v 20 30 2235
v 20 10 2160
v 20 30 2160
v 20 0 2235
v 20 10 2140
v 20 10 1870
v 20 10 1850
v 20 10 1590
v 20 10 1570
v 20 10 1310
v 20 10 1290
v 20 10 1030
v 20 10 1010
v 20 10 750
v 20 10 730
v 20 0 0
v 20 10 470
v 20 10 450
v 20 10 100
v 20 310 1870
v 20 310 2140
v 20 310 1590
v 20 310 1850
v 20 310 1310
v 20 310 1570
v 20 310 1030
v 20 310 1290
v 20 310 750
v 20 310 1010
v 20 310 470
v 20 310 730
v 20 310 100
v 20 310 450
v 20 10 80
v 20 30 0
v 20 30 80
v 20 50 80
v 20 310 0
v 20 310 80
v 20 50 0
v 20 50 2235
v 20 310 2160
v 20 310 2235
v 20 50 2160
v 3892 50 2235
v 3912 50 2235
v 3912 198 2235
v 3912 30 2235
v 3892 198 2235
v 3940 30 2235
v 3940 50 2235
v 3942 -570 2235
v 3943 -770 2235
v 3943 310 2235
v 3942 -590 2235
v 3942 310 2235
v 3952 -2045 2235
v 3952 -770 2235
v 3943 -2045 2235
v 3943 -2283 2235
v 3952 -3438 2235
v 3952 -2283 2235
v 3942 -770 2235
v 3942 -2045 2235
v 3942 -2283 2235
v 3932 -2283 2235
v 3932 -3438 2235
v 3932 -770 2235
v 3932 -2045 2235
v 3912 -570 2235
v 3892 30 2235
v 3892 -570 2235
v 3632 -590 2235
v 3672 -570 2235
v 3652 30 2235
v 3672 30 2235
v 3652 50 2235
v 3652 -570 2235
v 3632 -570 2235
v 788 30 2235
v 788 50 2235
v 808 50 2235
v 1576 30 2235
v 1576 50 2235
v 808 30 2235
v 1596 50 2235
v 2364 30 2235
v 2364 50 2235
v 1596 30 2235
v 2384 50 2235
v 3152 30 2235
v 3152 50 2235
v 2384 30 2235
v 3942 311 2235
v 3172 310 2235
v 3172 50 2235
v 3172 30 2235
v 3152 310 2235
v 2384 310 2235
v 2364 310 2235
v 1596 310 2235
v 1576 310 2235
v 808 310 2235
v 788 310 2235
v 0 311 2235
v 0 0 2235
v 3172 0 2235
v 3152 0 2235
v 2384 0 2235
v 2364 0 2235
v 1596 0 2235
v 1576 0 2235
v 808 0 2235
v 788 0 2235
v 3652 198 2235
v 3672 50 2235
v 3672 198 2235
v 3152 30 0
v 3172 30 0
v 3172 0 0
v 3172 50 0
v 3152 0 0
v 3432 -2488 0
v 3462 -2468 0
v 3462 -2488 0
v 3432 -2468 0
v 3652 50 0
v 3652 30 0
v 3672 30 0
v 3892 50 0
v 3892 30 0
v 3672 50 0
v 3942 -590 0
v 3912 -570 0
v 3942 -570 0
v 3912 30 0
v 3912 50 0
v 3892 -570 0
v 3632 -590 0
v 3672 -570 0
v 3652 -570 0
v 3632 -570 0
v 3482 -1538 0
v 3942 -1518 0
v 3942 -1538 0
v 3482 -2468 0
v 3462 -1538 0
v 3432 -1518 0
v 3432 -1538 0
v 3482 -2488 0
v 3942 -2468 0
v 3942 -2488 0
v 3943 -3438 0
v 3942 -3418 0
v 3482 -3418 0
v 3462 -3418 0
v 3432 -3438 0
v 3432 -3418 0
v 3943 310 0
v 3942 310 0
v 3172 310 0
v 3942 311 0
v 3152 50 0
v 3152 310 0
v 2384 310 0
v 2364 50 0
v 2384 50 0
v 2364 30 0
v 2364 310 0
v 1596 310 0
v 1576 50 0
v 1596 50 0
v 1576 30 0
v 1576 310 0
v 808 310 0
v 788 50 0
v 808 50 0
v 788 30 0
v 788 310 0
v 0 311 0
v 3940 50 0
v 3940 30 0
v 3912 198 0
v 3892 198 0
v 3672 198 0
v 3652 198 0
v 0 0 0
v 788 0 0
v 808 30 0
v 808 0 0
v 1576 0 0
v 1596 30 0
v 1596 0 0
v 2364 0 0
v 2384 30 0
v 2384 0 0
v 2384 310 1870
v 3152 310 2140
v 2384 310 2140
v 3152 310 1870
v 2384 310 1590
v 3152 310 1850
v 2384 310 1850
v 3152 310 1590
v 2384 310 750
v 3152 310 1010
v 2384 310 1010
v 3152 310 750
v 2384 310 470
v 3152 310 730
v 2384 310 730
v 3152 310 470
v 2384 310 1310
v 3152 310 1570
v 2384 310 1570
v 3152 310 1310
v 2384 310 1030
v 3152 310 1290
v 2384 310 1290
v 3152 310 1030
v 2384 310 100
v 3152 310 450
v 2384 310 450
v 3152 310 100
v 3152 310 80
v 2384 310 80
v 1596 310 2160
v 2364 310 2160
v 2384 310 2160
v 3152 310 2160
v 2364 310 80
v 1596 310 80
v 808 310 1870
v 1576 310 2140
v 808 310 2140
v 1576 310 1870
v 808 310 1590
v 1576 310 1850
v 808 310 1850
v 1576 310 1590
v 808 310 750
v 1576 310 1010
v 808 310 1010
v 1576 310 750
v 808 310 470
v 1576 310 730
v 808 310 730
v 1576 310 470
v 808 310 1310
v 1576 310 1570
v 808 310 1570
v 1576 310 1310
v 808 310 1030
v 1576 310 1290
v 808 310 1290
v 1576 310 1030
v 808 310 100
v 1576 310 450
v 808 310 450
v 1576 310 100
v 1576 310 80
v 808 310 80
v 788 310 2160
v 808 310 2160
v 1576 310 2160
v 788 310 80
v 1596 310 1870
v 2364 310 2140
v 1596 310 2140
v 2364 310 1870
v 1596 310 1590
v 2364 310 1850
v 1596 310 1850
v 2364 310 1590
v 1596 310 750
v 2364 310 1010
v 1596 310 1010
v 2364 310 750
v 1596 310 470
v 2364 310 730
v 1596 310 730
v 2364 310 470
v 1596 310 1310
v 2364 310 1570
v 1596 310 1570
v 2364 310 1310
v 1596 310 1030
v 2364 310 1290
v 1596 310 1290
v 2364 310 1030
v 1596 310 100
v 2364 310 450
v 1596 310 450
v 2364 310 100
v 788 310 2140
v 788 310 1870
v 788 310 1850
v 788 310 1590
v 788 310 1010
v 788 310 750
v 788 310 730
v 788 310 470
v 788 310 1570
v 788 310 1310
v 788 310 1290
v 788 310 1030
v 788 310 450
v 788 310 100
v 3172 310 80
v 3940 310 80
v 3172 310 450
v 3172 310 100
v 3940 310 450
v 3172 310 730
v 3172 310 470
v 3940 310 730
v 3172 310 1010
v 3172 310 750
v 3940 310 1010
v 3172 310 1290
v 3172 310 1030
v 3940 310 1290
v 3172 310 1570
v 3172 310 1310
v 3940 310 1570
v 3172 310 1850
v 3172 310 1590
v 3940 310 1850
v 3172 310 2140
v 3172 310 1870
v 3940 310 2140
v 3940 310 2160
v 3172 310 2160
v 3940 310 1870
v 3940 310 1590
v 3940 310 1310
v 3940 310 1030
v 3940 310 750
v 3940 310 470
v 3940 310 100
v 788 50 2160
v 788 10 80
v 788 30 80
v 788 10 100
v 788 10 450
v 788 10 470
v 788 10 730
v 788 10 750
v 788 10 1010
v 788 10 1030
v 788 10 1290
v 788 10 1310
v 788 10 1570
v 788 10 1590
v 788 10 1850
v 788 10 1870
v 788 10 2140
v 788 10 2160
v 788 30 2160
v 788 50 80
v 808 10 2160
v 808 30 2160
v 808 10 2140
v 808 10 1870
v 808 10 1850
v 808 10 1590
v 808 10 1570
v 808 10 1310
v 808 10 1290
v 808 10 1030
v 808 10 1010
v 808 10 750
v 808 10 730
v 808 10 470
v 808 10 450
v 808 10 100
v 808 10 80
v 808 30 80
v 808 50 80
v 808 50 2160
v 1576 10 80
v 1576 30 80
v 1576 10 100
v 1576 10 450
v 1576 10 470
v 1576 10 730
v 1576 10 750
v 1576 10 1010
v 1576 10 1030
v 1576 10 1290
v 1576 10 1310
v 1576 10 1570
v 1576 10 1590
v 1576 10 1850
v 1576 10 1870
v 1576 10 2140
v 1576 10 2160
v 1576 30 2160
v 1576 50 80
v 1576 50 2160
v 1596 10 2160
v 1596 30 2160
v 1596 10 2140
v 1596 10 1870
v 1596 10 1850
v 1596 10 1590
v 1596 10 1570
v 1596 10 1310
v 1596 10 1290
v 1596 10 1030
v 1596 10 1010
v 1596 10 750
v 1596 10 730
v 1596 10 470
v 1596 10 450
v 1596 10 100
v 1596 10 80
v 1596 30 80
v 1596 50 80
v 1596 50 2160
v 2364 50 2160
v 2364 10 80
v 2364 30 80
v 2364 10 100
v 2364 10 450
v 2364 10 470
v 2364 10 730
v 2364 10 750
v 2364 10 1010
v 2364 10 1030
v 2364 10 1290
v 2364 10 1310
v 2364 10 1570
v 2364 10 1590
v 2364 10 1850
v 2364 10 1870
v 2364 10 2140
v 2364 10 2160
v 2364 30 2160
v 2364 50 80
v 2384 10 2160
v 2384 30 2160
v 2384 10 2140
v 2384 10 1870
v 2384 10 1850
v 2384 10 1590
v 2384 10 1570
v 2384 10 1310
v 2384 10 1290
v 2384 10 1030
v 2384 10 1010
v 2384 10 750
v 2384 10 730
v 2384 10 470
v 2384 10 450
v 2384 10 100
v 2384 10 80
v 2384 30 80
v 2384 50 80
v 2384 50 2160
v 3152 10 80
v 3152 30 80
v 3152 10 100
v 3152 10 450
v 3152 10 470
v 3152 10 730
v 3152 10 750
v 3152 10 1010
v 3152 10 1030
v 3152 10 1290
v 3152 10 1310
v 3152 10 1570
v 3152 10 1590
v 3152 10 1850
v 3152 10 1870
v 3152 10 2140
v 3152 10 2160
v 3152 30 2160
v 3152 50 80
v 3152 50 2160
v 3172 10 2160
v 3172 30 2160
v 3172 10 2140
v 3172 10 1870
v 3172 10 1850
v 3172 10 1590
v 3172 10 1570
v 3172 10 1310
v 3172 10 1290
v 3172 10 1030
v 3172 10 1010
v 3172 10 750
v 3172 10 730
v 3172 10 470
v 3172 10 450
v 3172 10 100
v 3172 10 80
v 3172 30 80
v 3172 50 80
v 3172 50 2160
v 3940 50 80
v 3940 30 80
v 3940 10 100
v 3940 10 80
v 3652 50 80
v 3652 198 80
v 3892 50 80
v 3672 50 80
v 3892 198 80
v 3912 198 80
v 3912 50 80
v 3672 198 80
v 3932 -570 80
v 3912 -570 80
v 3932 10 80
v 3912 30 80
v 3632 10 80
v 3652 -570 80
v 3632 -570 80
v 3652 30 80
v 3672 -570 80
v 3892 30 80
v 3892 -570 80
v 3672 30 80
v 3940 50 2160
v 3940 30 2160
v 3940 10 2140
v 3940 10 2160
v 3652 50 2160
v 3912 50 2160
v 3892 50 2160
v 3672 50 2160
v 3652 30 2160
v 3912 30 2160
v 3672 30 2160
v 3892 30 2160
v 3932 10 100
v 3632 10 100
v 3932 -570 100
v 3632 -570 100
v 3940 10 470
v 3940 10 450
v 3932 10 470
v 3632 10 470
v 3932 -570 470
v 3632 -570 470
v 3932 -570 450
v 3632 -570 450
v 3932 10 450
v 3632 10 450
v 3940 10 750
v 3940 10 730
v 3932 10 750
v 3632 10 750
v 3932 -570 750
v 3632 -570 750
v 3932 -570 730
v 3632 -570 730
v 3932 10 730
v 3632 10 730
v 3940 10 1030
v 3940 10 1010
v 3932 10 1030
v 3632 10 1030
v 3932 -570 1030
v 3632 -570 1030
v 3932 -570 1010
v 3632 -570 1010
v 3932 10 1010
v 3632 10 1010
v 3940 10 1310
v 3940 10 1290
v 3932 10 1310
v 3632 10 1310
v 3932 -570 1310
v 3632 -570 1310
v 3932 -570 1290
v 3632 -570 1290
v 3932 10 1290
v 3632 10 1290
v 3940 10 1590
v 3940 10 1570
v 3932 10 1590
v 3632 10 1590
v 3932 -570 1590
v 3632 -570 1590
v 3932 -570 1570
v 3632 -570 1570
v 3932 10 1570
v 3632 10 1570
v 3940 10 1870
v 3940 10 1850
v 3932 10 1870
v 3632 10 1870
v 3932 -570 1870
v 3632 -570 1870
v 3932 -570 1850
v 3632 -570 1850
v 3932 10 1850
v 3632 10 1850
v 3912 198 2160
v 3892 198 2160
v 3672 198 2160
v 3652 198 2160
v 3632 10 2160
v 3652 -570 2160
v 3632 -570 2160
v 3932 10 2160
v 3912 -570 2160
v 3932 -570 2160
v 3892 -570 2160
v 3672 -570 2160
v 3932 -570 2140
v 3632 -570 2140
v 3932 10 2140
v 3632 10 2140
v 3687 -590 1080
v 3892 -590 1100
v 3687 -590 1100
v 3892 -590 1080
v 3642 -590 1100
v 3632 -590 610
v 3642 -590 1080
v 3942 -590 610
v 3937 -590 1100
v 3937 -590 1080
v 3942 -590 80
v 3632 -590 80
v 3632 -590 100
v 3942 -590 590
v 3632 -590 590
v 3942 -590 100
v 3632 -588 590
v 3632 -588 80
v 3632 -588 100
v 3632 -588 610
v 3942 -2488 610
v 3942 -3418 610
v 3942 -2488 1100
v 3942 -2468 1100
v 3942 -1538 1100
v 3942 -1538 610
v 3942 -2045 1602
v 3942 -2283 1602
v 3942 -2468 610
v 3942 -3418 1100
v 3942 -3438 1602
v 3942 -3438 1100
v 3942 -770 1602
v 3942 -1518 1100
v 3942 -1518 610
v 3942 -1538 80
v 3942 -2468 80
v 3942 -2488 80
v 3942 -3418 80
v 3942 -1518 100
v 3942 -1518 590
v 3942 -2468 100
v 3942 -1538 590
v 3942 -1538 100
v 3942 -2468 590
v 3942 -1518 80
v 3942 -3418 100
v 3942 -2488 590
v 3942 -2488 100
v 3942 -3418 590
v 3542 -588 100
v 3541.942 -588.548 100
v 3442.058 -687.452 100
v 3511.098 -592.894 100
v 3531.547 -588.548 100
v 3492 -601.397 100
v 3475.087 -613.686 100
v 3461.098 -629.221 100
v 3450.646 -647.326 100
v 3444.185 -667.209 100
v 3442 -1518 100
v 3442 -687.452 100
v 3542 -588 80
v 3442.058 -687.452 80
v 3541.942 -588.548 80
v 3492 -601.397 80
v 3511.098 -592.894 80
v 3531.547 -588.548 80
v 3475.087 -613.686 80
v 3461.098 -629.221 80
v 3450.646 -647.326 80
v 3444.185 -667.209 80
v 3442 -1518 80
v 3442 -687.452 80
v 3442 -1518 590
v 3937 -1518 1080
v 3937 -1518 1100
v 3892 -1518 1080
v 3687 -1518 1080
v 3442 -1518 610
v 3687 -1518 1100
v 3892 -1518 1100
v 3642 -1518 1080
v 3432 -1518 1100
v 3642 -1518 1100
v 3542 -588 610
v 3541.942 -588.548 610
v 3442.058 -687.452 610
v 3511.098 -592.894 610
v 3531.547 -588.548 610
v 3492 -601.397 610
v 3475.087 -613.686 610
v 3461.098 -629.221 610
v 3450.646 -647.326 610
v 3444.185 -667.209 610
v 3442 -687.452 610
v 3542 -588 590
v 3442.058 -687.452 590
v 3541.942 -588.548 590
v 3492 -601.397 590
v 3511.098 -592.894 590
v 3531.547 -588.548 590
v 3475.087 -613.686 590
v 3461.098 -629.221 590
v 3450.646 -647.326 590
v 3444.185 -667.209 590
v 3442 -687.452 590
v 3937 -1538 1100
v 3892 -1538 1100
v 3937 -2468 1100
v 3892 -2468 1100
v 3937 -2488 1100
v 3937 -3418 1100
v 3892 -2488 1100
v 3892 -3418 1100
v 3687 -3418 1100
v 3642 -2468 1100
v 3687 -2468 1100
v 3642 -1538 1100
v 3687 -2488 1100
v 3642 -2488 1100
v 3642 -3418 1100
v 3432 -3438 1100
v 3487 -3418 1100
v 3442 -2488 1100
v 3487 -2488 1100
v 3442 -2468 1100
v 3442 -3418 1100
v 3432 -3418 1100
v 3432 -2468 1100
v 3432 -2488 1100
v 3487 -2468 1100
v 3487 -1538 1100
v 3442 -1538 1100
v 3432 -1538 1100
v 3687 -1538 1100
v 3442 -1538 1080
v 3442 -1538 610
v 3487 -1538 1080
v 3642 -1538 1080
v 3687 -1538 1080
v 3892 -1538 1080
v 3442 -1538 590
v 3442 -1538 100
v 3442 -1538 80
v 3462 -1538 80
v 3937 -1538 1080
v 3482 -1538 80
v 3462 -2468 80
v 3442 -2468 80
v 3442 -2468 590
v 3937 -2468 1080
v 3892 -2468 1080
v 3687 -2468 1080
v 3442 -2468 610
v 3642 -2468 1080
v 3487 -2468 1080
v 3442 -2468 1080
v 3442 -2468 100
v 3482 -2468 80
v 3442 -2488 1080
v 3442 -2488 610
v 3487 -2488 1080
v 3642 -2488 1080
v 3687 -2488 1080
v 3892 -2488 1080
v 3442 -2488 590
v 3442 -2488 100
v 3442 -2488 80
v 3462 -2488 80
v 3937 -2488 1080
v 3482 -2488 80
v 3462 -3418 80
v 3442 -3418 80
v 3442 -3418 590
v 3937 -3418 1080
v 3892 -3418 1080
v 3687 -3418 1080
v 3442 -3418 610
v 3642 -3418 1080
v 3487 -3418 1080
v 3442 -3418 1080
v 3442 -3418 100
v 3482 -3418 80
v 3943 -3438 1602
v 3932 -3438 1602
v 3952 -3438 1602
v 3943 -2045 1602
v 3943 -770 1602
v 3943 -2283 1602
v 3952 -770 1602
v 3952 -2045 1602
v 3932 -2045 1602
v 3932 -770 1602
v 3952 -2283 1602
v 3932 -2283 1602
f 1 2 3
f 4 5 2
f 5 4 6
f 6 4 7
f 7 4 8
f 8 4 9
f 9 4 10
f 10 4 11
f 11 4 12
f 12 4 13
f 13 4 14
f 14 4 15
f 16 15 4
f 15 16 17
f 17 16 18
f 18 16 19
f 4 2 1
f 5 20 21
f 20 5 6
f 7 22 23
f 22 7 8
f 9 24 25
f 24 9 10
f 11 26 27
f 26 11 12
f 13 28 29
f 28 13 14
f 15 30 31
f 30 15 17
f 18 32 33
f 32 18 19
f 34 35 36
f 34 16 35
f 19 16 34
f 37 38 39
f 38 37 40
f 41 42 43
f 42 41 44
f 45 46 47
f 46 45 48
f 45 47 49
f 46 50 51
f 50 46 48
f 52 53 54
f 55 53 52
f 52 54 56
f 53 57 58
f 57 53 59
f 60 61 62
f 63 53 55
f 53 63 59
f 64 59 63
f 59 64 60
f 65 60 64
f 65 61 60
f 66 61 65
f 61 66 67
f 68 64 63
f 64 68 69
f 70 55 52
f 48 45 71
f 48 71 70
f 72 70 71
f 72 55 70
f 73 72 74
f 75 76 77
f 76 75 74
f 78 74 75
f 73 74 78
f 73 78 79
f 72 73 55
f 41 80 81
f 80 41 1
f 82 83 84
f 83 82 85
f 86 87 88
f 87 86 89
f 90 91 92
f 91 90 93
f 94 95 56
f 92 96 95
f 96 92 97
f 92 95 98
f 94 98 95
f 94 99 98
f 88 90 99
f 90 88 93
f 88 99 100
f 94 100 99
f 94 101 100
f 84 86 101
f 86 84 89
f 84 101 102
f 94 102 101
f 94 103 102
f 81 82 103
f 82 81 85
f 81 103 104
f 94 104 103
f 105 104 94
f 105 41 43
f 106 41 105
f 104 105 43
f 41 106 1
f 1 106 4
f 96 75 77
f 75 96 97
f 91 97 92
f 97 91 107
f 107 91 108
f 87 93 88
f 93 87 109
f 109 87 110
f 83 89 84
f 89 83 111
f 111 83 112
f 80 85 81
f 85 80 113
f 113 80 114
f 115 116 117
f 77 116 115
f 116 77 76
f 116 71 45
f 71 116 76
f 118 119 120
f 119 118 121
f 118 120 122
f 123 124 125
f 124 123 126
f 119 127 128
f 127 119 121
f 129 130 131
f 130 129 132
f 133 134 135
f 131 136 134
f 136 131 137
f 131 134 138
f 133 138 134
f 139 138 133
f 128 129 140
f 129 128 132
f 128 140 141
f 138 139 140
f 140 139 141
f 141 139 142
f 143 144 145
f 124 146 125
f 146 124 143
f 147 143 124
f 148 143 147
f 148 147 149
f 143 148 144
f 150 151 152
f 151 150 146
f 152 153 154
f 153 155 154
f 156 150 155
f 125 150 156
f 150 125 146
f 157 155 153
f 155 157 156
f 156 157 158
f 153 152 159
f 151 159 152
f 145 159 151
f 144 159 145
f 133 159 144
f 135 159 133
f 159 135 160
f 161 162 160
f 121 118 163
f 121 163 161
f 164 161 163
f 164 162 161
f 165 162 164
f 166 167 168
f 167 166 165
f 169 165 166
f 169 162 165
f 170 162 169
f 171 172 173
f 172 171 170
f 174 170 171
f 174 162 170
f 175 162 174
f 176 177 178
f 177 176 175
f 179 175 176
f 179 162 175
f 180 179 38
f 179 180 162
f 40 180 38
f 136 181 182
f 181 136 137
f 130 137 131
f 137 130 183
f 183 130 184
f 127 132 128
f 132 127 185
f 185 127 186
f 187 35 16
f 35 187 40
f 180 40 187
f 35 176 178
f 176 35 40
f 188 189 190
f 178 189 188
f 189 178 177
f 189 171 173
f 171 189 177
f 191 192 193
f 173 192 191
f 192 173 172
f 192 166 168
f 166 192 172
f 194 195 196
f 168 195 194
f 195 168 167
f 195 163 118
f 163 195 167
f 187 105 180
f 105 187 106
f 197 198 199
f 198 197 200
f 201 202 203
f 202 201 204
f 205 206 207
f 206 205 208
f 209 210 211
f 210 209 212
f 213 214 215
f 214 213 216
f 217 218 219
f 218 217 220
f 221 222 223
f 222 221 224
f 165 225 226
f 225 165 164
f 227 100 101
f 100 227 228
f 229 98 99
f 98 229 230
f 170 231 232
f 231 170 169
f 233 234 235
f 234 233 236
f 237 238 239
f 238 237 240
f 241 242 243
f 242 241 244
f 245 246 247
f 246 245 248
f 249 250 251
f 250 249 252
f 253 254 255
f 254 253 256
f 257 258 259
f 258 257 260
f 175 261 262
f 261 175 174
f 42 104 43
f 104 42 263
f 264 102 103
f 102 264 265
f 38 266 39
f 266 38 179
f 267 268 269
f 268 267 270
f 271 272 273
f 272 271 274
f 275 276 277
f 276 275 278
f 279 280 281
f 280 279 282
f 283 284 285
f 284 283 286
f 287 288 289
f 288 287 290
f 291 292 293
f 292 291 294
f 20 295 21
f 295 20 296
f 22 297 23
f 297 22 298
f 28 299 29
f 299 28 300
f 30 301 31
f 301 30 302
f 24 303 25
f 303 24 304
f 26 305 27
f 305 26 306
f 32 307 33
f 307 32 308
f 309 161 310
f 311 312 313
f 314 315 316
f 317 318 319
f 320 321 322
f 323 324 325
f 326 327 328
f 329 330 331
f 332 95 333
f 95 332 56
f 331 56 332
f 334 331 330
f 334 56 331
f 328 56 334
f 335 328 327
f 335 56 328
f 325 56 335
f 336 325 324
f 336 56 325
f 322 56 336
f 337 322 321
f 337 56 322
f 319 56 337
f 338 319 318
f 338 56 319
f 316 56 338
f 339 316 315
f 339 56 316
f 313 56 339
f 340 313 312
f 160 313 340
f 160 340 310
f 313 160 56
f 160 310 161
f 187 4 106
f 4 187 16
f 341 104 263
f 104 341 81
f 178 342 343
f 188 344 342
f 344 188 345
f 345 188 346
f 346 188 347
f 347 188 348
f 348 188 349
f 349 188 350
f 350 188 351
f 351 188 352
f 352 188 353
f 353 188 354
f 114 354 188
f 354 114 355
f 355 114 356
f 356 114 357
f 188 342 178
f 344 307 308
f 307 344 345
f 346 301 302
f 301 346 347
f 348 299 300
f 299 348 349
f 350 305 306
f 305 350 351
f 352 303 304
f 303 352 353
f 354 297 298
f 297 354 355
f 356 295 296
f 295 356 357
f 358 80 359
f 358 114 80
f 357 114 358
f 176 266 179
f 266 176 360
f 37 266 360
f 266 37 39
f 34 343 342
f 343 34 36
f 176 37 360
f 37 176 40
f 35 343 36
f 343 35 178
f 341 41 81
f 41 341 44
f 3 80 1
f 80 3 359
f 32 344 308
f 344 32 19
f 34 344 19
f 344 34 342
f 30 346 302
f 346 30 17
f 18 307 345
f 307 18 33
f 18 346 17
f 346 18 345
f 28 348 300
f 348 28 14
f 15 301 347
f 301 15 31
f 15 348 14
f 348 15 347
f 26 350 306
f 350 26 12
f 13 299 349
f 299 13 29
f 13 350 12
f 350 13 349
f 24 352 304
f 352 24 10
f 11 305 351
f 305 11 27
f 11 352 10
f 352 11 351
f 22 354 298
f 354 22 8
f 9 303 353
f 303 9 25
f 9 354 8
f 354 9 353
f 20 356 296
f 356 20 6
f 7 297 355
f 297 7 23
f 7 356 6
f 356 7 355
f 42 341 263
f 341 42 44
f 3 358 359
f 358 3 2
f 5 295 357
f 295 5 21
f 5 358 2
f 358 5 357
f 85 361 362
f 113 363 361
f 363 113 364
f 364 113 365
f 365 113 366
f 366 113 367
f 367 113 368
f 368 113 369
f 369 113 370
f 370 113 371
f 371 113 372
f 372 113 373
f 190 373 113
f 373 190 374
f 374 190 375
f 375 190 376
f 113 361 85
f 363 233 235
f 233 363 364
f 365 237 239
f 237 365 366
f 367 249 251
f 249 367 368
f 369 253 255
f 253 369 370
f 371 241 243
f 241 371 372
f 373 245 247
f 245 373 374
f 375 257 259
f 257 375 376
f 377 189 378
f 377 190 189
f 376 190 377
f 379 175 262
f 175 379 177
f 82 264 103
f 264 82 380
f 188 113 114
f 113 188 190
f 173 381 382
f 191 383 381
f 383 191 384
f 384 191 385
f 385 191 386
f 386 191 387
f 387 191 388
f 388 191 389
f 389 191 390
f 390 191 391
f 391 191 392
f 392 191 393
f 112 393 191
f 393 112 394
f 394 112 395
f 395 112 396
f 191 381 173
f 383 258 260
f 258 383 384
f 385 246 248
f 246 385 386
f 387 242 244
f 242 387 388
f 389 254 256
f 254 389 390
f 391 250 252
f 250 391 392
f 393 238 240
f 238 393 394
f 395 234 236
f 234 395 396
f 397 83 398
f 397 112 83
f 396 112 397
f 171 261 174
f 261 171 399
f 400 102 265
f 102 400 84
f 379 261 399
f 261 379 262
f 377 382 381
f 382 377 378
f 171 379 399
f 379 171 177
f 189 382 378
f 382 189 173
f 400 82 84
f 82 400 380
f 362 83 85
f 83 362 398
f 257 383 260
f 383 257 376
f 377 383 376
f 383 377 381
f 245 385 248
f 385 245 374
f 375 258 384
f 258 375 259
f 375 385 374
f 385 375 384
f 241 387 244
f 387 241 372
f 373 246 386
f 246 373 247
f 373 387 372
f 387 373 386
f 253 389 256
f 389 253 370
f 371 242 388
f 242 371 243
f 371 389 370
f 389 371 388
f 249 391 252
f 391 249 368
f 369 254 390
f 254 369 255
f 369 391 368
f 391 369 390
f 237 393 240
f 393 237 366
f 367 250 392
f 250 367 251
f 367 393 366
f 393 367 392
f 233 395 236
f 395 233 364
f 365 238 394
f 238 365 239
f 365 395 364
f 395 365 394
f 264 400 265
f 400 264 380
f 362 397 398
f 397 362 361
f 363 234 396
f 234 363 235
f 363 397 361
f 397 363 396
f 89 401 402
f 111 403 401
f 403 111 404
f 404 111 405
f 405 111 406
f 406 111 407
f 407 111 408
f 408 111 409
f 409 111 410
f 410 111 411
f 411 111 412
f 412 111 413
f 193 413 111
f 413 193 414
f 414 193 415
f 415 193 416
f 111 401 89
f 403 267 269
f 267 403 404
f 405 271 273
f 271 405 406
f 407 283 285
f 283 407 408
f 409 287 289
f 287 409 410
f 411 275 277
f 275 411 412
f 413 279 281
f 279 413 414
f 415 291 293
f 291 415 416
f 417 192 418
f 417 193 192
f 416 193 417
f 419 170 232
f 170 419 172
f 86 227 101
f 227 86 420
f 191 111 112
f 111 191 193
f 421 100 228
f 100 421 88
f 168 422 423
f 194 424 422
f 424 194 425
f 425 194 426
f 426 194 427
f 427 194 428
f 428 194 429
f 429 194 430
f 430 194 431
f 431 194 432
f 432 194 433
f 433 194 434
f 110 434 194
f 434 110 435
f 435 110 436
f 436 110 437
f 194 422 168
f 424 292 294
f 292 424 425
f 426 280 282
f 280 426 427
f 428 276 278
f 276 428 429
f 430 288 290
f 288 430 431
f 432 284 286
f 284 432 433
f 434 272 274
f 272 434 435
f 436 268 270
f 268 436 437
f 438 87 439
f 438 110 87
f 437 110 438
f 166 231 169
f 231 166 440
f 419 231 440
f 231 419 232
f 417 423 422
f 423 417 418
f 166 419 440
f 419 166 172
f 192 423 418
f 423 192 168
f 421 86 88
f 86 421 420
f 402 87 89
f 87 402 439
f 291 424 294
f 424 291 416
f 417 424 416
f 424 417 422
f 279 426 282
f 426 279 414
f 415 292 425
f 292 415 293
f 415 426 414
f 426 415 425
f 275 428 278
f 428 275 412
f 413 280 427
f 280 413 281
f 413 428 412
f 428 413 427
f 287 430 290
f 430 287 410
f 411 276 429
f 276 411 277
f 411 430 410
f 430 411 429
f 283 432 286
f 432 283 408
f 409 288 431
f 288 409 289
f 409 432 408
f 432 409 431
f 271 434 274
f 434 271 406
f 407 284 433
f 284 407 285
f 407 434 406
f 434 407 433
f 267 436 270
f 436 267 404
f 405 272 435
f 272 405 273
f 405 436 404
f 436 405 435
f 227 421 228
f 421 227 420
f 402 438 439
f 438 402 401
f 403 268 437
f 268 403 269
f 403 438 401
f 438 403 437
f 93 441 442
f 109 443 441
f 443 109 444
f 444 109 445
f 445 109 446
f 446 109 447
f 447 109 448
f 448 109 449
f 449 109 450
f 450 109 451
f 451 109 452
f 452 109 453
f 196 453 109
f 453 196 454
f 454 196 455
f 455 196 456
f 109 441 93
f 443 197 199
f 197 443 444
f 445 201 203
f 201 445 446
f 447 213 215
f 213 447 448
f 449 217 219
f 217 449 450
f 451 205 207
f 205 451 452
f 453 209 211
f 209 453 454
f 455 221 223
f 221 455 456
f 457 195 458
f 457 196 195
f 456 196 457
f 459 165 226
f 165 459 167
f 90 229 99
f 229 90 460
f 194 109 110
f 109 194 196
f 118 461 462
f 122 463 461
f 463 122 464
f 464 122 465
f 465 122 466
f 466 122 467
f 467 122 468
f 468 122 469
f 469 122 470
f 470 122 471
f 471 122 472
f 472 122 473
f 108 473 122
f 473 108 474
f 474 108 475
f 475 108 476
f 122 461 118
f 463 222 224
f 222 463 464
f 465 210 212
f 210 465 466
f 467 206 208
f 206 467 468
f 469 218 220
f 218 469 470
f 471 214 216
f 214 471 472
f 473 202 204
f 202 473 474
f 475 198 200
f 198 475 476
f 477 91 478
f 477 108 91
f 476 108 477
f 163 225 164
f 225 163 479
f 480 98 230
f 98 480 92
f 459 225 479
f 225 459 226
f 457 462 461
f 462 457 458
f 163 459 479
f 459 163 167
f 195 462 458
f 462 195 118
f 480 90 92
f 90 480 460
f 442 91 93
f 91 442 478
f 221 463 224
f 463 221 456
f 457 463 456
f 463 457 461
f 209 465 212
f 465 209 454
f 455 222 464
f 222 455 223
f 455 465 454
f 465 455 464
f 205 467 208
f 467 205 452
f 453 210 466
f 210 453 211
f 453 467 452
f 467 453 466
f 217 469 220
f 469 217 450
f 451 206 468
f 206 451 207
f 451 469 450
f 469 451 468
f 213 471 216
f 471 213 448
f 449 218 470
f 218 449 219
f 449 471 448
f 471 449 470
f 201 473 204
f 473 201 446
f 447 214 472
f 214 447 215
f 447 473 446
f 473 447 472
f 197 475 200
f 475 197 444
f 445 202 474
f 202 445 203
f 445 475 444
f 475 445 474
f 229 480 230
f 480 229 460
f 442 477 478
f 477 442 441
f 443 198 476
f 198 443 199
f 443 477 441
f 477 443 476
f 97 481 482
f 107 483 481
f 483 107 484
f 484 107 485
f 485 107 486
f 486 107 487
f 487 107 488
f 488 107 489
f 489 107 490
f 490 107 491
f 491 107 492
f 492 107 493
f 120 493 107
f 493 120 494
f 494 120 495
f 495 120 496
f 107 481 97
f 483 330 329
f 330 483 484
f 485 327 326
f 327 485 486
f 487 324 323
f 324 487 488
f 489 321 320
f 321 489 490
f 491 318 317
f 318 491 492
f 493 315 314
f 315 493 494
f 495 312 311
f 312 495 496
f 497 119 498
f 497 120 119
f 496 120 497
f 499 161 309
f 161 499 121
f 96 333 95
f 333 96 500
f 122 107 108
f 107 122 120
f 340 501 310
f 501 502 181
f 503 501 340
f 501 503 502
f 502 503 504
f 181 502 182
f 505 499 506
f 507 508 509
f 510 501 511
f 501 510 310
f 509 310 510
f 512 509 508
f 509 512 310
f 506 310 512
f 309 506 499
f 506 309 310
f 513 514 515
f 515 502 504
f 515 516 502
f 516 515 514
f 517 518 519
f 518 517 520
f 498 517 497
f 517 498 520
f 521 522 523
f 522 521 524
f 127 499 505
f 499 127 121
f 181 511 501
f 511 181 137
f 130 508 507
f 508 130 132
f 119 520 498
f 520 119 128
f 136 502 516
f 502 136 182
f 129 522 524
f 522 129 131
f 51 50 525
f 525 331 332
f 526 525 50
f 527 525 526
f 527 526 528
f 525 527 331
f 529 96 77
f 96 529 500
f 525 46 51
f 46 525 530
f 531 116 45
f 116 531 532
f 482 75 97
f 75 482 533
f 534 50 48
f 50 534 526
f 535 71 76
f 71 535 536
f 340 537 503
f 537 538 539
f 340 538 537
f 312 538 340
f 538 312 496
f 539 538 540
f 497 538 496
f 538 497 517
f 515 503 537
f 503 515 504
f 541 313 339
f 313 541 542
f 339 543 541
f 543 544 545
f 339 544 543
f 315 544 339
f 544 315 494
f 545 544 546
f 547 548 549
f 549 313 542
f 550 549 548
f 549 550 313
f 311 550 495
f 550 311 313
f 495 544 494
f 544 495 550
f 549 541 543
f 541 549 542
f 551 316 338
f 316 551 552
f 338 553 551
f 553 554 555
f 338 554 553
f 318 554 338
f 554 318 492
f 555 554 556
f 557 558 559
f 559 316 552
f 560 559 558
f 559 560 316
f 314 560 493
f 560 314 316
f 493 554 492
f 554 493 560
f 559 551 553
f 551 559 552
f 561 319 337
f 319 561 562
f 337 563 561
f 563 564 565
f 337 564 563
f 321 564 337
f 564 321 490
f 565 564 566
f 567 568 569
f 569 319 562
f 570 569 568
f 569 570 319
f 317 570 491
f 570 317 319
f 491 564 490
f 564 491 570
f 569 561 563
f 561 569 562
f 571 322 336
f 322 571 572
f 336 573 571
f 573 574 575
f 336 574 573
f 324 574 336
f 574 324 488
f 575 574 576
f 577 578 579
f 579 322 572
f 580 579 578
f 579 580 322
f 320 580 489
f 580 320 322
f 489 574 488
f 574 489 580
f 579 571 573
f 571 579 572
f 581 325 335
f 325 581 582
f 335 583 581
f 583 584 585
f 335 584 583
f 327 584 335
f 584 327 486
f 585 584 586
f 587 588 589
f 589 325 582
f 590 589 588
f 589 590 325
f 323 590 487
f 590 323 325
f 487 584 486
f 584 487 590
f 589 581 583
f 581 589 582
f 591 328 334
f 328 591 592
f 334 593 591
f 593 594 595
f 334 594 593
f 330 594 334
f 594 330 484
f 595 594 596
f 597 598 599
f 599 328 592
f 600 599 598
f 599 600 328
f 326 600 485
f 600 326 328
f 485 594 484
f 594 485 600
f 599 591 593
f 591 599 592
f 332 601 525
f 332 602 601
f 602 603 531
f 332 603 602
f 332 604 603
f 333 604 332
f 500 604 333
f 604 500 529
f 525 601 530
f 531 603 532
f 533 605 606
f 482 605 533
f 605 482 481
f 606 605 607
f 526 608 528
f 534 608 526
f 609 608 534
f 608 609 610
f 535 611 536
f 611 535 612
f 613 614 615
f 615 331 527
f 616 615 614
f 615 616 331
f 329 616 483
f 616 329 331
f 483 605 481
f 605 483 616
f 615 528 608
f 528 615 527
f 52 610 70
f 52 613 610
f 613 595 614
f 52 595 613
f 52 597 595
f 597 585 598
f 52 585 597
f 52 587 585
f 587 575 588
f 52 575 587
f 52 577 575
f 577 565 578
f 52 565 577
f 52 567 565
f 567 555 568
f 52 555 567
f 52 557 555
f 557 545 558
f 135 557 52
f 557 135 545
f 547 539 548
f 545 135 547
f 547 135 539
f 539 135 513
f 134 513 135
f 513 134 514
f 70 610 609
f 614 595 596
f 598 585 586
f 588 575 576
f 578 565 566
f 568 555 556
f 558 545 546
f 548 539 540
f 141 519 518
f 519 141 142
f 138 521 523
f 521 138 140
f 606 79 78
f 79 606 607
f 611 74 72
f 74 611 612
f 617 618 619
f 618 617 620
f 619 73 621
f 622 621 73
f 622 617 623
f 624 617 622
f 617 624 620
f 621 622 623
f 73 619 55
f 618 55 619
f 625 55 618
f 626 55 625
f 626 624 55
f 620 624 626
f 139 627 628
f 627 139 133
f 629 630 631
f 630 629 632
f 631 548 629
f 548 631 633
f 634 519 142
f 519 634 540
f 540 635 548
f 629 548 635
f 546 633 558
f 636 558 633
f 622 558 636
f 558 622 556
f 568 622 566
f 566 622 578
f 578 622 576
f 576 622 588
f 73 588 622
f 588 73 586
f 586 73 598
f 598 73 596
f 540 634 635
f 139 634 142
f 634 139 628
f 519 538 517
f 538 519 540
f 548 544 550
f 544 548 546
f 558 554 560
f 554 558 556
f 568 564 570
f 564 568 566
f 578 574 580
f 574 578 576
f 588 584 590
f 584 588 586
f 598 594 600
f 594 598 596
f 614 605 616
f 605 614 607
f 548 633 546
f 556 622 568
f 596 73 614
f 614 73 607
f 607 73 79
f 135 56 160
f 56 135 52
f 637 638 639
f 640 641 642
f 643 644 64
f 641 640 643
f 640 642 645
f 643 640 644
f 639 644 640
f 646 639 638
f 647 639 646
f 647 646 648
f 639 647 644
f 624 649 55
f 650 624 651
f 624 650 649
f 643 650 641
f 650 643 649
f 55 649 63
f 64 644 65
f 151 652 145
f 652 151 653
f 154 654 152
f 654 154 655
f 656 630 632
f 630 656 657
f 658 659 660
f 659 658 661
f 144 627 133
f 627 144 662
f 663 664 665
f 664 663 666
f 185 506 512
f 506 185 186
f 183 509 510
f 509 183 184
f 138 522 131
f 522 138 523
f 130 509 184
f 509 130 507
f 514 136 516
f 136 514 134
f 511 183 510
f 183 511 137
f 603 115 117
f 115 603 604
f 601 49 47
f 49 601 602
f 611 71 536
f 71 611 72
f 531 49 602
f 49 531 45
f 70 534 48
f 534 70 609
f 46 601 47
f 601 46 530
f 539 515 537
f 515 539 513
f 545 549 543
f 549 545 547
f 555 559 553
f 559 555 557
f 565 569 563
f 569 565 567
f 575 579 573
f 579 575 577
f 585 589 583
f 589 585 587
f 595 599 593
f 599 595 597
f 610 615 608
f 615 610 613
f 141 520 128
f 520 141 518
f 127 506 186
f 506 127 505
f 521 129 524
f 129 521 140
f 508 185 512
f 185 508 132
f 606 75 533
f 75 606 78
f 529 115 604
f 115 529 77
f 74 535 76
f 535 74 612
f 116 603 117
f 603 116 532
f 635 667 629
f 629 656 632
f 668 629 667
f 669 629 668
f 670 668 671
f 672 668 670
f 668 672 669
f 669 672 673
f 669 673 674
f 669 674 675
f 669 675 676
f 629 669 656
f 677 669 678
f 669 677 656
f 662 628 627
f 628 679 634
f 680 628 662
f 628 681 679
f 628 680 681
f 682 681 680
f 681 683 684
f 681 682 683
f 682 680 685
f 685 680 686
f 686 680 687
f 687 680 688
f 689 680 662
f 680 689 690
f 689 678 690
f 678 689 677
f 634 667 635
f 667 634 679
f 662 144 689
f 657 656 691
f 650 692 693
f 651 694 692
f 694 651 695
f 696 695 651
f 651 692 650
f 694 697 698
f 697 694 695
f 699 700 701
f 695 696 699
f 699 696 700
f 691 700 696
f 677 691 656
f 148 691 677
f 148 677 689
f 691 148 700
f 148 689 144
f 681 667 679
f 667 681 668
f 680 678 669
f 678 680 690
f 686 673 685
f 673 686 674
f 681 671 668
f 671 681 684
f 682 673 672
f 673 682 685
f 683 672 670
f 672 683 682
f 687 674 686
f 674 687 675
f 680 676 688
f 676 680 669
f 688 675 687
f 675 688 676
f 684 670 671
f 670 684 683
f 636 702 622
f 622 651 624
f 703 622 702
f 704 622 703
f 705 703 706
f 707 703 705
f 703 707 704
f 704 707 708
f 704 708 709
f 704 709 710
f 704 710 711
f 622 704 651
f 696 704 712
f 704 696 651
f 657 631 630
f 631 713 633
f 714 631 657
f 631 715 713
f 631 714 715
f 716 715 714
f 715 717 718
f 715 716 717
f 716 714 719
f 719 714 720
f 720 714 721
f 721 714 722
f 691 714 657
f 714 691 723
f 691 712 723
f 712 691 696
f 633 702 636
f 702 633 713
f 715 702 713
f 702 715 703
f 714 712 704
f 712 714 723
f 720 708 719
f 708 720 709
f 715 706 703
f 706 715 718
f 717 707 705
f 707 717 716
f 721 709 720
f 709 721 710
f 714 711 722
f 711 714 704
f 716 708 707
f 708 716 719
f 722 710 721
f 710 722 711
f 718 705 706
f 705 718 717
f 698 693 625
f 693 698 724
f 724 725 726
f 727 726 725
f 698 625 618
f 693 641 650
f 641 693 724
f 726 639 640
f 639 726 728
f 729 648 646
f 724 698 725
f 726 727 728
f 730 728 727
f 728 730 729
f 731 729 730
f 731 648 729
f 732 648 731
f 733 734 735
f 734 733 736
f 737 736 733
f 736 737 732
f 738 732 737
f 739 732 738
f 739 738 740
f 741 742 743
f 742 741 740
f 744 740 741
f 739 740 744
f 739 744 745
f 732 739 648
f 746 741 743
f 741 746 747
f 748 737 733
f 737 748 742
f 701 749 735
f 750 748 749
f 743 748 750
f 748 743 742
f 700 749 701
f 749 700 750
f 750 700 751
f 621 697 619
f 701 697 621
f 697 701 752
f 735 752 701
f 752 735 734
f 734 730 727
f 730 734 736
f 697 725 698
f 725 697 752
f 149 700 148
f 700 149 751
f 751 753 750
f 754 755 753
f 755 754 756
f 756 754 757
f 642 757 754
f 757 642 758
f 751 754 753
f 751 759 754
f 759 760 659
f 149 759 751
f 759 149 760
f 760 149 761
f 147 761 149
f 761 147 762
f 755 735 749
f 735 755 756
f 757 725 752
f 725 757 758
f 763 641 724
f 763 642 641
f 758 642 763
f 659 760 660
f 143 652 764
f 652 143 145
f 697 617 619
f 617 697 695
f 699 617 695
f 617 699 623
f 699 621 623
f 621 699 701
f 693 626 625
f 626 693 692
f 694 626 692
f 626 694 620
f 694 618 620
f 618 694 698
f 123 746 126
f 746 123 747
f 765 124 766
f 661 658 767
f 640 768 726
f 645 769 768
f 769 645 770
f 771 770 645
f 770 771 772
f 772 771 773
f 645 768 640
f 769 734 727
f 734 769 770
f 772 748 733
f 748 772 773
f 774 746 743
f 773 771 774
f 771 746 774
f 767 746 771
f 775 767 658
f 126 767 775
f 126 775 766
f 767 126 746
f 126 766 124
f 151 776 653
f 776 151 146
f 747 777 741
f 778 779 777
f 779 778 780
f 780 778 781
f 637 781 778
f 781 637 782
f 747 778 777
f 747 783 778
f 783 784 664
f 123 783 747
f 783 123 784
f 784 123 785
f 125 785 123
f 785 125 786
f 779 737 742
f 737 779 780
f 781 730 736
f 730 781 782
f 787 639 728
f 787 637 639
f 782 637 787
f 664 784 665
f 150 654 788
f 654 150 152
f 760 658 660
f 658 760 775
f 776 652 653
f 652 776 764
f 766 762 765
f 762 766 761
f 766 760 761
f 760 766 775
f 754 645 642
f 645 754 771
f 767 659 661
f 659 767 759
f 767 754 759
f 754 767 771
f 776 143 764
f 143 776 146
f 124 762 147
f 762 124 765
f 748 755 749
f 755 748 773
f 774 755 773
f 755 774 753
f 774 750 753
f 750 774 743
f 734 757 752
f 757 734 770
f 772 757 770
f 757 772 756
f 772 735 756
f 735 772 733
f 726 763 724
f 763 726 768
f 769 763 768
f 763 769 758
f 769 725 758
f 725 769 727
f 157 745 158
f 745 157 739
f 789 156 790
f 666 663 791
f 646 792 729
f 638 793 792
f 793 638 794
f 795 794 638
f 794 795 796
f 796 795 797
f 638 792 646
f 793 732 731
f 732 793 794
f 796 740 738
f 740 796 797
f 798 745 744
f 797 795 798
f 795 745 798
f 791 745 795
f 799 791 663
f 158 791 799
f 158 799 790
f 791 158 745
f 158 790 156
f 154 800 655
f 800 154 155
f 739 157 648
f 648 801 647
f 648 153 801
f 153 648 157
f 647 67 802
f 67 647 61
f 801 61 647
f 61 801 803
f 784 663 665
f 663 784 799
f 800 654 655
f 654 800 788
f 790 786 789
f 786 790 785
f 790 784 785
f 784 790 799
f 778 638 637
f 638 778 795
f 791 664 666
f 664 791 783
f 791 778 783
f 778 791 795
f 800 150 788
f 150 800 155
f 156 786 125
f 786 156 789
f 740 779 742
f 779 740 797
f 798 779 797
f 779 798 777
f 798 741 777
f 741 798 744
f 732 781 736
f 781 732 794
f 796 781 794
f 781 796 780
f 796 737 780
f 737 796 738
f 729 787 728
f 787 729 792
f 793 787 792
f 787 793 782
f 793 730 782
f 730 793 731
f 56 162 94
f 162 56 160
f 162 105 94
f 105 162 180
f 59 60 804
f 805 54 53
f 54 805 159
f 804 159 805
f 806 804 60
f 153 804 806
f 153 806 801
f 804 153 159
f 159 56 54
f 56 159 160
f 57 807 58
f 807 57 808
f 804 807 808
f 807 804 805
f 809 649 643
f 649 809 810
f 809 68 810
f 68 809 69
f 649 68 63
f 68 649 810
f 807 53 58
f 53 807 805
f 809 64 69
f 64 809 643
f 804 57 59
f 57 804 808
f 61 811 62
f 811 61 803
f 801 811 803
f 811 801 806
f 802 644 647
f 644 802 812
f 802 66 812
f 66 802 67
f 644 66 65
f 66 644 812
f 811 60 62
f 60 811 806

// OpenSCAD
// Variables so we can switch stuff around easier
drawing_offset = 310;

thickness = 20;

bookcase_beam_depth = 310;
bookcase_shelf_depth = 300;

bookcase_width = 768;
bookcase_height = 2235;

shelf_1 = 80;
shelf_2 = shelf_1 + thickness + 350;
shelf_3 = shelf_2 + thickness + 260;
shelf_4 = shelf_3 + thickness + 260;
shelf_5 = shelf_4 + thickness + 260;
shelf_6 = shelf_5 + thickness + 260;
shelf_7 = shelf_6 + thickness + 260;
shelf_8 = shelf_7 + thickness + 270;

gameshelf_depth = 500;
gameshelf_beam_depth = 510;

gameshelf_width = 950;
gameshelf_height = 1100;

gameshelf_1 = 80;
gameshelf_2 = 590;

wall_height = 2235;
wall_1_width = 3942;
wall_2_width = 3748;

window_height = 633;
window_1_width = 1155;
window_2_width = 1275;
window_distance_between = 238;

// wall 1 3942 x 2230
translate([0, drawing_offset, 0]) {
    color("white"){cube(size = [wall_1_width, 1, wall_height], center = false);}
}
// wall w windows 3748 x 2230
translate([wall_1_width, drawing_offset - wall_2_width, 0]) {
    color("white"){cube(size = [1, wall_2_width, wall_height], center = false);}
}
// window 2
translate([wall_1_width - 10, drawing_offset + window_distance_between + window_1_width - wall_2_width, wall_height - window_height]) {
    color("blue"){cube(size = [20, window_2_width, window_height], center = false);}
}

// window 1
translate([wall_1_width - 10, drawing_offset - wall_2_width, wall_height - window_height]) {
    color("blue"){cube(size = [20, window_1_width, window_height], center = false);}
}

module shelf(pos){
    translate([20, 10, pos]){
        cube(size = [bookcase_width, bookcase_shelf_depth, thickness], center = false);
    }
}

module bookshelf(pos){
    translate([pos, 0, 0]){
        //beam
        cube(size = [thickness, bookcase_beam_depth, bookcase_height], center = false);
        // bottom cover
        translate([20, 30, 0]){
            cube(size = [bookcase_width, thickness, 80], center = false);
        }
        // top cover
        translate([20, 30, bookcase_height - 80]){
            cube(size = [bookcase_width, thickness, 80], center = false);
        }
        // shelfs
        shelf(shelf_1);
        shelf(shelf_2);
        shelf(shelf_3);
        shelf(shelf_4);
        shelf(shelf_5);
        shelf(shelf_6);
        shelf(shelf_7);
        shelf(shelf_8);
    }
}

bookshelf(0);
bookshelf(bookcase_width + thickness);
bookshelf(2*(bookcase_width + thickness));
bookshelf(3*(bookcase_width + thickness));
bookshelf(4*(bookcase_width + thickness));

// Wall 2 (with windows)

// bookshelf in the corner, lazy switcharoo since it's just a mindmap
translate([wall_1_width, bookcase_beam_depth - 900, 0]){
    rotate(a=[0,0,90]){
        translate([20, 270, 0]){
            cube(size = [bookcase_width, thickness, 80], center = false);
        }
        translate([20, 270, bookcase_height - 80]){
            cube(size = [bookcase_width, thickness, 80], center = false);
        }
        bookshelf(0);
    }
}


module gameshelf(pos){
    translate([wall_1_width - gameshelf_beam_depth, bookcase_beam_depth - 900 - pos, 0]){
        // beam
        cube(size = [gameshelf_beam_depth, thickness, gameshelf_height], center = false);
        // shelf 1
        translate([10, 20, 80]){
            cube(size = [gameshelf_depth, gameshelf_width, thickness], center = false);
        }
        // shelf 2
        translate([10, 20, 590]){
            cube(size = [gameshelf_depth, gameshelf_width, thickness], center = false);
        }
        // bottom cover
        translate([30, 20, 0]){
            cube(size = [thickness, gameshelf_width, 80], center = false);
        }
        // horizontal beams for tabletop
        translate([10, 20, gameshelf_height - thickness]){
            cube(size = [45, gameshelf_width, thickness], center = false);
        }
        translate([210, 20, gameshelf_height - thickness]){
            cube(size = [45, gameshelf_width, thickness], center = false);
        }
        translate([460, 20, gameshelf_height - thickness]){
            cube(size = [45, gameshelf_width, thickness], center = false);
        }
    }
}

module roundedgameshelf(pos){
    translate([wall_1_width - gameshelf_beam_depth, bookcase_beam_depth - 900 - pos, 0]){
        // beam
        cube(size = [gameshelf_beam_depth, thickness, gameshelf_height], center = false);
        // shelf 1 with rounded corner
        translate([10, 20, gameshelf_1]){
            difference(){
                cube(size = [gameshelf_depth, 930, thickness], center = false);
                translate([0,930,-1]){
                    cylinder(h=22,r=100);
                }
            }
            translate([100,830,0]){
                cylinder(h=thickness,r=100);
            }
        }
        // shelf 2 with rounded corner
        translate([10, 20, gameshelf_2]){
            difference(){
                cube(size = [gameshelf_depth, 930, thickness], center = false);
                translate([0,930,-1]){
                    cylinder(h=22,r=100);
                }
            }
            translate([100,830,0]){
                cylinder(h=thickness,r=100);
            }
        }
        // horizontal beams for tabletop
        translate([210, 20, gameshelf_height - thickness]){
            cube(size = [45, 930, thickness], center = false);
        }
        translate([460, 20, gameshelf_height - thickness]){
            cube(size = [45, 930, thickness], center = false);
        }
    }
}

roundedgameshelf(wall_2_width - 2800);
gameshelf(wall_2_width - 1850);
gameshelf(wall_2_width - 900);

// Notes

// Measurements
// 48 st 768x300 shelf                       Cost: 4 full sheats
// 6 st 2235x310 shelf beams                 Cost: 2 sheats, rest of wood should be used for trims/cover_top/bottom (will cover 18 pieces of trim)
// 3 st 1100x510 game shelf beams            Cost: 1 sheat, last cutout will be trimmed to gameshelf, cuttoffs will be glued to last game shelf
// 6 st 950x500  game shelf                  Cost: 1 sheat, cuttoffs will be glued to last game shelf.

// Material
// 8 st 2500 x 1220 
